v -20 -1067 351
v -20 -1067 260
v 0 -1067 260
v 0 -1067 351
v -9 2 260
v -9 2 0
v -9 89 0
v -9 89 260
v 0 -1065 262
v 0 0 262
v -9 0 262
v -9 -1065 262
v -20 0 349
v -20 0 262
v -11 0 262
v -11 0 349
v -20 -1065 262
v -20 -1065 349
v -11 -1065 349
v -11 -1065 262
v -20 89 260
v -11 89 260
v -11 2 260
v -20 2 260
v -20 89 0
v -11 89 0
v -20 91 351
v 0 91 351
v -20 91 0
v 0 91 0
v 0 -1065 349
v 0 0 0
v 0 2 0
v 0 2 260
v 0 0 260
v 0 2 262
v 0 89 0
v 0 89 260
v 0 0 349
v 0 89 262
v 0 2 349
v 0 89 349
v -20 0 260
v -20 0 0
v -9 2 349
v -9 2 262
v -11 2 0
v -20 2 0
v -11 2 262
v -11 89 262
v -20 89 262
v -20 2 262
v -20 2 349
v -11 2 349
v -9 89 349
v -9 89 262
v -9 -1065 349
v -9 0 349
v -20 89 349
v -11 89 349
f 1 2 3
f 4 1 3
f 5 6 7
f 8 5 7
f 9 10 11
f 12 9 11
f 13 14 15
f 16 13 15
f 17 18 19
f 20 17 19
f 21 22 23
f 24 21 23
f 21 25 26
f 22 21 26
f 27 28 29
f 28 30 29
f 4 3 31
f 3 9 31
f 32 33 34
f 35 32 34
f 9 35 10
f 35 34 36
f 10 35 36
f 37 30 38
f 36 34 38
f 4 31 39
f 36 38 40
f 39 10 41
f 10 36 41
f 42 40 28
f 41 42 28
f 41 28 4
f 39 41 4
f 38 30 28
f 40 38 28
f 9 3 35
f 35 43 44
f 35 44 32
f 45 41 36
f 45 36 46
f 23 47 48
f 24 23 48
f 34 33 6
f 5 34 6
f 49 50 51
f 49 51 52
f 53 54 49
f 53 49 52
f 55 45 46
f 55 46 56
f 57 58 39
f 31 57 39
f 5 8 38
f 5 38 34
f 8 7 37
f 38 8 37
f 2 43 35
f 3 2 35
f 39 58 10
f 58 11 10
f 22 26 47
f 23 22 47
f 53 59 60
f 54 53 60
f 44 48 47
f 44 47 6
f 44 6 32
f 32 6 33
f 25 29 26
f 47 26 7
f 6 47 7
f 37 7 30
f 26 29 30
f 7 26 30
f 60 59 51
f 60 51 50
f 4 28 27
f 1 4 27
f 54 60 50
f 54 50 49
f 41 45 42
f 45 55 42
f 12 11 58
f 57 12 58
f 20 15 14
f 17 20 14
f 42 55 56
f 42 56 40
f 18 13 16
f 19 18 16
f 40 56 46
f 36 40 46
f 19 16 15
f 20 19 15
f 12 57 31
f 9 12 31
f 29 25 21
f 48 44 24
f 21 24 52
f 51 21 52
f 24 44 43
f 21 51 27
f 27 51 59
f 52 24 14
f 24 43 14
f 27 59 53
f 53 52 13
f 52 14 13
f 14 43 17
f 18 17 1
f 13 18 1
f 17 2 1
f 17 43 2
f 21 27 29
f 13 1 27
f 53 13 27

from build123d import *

# Parameters (mm, degrees)
F1_DEPTH  = 349
F2_W      = 9
F2_H      = 87
F3_DEPTH  = 2
F4_W      = 87
F4_H      = 2
F5_DEPTH  = 9
F6_DEPTH  = 11
F8_DEPTH  = 1067
F9_W      = 9
F9_H      = 87
F10_DEPTH = 2


with BuildPart() as f1:
    # F0 (on Top) → F1 (new body)
    with BuildSketch(Plane.XY):
        Polygon((-20, 0), (0, 0), (0, 2), (-9, 2), (-9, 89), (0, 89), (0, 91), (-20, 91), (-20, 89), (-11, 89), (-11, 2), (-20, 2), align=None)
    extrude(amount=F1_DEPTH)

    # F2 (on face) → F3 (join)
    with BuildSketch(Plane.XY.offset(349)):
        Polygon((-20, 0), (0, 0), (0, 2), (-9, 2), (-9, 89), (0, 89), (0, 91), (-20, 91), (-20, 89), (-11, 89), (-11, 2), (-20, 2), align=None)
        with Locations((-15.5, 45.5)):
            Rectangle(F2_W, F2_H)
        with Locations((-4.5, 45.5)):
            Rectangle(F2_W, F2_H)
    extrude(amount=F3_DEPTH)

    # F4 (on face) → F5 (join, through all)
    with BuildSketch(Plane(origin=(-11, 0, 0), x_dir=(0, -1, 0), z_dir=(-1, 0, 0))):
        with Locations((-45.5, 261)):
            Rectangle(F4_W, F4_H)
    extrude(amount=F5_DEPTH)

    # F4 (on face) → F6 (join, through all)
    with BuildSketch(Plane(origin=(-11, 0, 0), x_dir=(0, -1, 0), z_dir=(-1, 0, 0))):
        with Locations((-45.5, 261)):
            Rectangle(F4_W, F4_H)
    extrude(amount=-F6_DEPTH)

    # F7 (on face) → F8 (join)
    with BuildSketch(Plane.XZ):
        Polygon((0, 351), (-20, 351), (-20, 349), (-11, 349), (-11, 262), (-20, 262), (-20, 260), (0, 260), (0, 262), (-9, 262), (-9, 349), (0, 349), align=None)
    extrude(amount=F8_DEPTH)

    # F9 (on face) → F10 (join)
    with BuildSketch(Plane.XZ.offset(1067)):
        with Locations((-15.5, 305.5)):
            Rectangle(F9_W, F9_H)
        with Locations((-4.5, 305.5)):
            Rectangle(F9_W, F9_H)
    extrude(amount=-F10_DEPTH)


solid = f1.part
